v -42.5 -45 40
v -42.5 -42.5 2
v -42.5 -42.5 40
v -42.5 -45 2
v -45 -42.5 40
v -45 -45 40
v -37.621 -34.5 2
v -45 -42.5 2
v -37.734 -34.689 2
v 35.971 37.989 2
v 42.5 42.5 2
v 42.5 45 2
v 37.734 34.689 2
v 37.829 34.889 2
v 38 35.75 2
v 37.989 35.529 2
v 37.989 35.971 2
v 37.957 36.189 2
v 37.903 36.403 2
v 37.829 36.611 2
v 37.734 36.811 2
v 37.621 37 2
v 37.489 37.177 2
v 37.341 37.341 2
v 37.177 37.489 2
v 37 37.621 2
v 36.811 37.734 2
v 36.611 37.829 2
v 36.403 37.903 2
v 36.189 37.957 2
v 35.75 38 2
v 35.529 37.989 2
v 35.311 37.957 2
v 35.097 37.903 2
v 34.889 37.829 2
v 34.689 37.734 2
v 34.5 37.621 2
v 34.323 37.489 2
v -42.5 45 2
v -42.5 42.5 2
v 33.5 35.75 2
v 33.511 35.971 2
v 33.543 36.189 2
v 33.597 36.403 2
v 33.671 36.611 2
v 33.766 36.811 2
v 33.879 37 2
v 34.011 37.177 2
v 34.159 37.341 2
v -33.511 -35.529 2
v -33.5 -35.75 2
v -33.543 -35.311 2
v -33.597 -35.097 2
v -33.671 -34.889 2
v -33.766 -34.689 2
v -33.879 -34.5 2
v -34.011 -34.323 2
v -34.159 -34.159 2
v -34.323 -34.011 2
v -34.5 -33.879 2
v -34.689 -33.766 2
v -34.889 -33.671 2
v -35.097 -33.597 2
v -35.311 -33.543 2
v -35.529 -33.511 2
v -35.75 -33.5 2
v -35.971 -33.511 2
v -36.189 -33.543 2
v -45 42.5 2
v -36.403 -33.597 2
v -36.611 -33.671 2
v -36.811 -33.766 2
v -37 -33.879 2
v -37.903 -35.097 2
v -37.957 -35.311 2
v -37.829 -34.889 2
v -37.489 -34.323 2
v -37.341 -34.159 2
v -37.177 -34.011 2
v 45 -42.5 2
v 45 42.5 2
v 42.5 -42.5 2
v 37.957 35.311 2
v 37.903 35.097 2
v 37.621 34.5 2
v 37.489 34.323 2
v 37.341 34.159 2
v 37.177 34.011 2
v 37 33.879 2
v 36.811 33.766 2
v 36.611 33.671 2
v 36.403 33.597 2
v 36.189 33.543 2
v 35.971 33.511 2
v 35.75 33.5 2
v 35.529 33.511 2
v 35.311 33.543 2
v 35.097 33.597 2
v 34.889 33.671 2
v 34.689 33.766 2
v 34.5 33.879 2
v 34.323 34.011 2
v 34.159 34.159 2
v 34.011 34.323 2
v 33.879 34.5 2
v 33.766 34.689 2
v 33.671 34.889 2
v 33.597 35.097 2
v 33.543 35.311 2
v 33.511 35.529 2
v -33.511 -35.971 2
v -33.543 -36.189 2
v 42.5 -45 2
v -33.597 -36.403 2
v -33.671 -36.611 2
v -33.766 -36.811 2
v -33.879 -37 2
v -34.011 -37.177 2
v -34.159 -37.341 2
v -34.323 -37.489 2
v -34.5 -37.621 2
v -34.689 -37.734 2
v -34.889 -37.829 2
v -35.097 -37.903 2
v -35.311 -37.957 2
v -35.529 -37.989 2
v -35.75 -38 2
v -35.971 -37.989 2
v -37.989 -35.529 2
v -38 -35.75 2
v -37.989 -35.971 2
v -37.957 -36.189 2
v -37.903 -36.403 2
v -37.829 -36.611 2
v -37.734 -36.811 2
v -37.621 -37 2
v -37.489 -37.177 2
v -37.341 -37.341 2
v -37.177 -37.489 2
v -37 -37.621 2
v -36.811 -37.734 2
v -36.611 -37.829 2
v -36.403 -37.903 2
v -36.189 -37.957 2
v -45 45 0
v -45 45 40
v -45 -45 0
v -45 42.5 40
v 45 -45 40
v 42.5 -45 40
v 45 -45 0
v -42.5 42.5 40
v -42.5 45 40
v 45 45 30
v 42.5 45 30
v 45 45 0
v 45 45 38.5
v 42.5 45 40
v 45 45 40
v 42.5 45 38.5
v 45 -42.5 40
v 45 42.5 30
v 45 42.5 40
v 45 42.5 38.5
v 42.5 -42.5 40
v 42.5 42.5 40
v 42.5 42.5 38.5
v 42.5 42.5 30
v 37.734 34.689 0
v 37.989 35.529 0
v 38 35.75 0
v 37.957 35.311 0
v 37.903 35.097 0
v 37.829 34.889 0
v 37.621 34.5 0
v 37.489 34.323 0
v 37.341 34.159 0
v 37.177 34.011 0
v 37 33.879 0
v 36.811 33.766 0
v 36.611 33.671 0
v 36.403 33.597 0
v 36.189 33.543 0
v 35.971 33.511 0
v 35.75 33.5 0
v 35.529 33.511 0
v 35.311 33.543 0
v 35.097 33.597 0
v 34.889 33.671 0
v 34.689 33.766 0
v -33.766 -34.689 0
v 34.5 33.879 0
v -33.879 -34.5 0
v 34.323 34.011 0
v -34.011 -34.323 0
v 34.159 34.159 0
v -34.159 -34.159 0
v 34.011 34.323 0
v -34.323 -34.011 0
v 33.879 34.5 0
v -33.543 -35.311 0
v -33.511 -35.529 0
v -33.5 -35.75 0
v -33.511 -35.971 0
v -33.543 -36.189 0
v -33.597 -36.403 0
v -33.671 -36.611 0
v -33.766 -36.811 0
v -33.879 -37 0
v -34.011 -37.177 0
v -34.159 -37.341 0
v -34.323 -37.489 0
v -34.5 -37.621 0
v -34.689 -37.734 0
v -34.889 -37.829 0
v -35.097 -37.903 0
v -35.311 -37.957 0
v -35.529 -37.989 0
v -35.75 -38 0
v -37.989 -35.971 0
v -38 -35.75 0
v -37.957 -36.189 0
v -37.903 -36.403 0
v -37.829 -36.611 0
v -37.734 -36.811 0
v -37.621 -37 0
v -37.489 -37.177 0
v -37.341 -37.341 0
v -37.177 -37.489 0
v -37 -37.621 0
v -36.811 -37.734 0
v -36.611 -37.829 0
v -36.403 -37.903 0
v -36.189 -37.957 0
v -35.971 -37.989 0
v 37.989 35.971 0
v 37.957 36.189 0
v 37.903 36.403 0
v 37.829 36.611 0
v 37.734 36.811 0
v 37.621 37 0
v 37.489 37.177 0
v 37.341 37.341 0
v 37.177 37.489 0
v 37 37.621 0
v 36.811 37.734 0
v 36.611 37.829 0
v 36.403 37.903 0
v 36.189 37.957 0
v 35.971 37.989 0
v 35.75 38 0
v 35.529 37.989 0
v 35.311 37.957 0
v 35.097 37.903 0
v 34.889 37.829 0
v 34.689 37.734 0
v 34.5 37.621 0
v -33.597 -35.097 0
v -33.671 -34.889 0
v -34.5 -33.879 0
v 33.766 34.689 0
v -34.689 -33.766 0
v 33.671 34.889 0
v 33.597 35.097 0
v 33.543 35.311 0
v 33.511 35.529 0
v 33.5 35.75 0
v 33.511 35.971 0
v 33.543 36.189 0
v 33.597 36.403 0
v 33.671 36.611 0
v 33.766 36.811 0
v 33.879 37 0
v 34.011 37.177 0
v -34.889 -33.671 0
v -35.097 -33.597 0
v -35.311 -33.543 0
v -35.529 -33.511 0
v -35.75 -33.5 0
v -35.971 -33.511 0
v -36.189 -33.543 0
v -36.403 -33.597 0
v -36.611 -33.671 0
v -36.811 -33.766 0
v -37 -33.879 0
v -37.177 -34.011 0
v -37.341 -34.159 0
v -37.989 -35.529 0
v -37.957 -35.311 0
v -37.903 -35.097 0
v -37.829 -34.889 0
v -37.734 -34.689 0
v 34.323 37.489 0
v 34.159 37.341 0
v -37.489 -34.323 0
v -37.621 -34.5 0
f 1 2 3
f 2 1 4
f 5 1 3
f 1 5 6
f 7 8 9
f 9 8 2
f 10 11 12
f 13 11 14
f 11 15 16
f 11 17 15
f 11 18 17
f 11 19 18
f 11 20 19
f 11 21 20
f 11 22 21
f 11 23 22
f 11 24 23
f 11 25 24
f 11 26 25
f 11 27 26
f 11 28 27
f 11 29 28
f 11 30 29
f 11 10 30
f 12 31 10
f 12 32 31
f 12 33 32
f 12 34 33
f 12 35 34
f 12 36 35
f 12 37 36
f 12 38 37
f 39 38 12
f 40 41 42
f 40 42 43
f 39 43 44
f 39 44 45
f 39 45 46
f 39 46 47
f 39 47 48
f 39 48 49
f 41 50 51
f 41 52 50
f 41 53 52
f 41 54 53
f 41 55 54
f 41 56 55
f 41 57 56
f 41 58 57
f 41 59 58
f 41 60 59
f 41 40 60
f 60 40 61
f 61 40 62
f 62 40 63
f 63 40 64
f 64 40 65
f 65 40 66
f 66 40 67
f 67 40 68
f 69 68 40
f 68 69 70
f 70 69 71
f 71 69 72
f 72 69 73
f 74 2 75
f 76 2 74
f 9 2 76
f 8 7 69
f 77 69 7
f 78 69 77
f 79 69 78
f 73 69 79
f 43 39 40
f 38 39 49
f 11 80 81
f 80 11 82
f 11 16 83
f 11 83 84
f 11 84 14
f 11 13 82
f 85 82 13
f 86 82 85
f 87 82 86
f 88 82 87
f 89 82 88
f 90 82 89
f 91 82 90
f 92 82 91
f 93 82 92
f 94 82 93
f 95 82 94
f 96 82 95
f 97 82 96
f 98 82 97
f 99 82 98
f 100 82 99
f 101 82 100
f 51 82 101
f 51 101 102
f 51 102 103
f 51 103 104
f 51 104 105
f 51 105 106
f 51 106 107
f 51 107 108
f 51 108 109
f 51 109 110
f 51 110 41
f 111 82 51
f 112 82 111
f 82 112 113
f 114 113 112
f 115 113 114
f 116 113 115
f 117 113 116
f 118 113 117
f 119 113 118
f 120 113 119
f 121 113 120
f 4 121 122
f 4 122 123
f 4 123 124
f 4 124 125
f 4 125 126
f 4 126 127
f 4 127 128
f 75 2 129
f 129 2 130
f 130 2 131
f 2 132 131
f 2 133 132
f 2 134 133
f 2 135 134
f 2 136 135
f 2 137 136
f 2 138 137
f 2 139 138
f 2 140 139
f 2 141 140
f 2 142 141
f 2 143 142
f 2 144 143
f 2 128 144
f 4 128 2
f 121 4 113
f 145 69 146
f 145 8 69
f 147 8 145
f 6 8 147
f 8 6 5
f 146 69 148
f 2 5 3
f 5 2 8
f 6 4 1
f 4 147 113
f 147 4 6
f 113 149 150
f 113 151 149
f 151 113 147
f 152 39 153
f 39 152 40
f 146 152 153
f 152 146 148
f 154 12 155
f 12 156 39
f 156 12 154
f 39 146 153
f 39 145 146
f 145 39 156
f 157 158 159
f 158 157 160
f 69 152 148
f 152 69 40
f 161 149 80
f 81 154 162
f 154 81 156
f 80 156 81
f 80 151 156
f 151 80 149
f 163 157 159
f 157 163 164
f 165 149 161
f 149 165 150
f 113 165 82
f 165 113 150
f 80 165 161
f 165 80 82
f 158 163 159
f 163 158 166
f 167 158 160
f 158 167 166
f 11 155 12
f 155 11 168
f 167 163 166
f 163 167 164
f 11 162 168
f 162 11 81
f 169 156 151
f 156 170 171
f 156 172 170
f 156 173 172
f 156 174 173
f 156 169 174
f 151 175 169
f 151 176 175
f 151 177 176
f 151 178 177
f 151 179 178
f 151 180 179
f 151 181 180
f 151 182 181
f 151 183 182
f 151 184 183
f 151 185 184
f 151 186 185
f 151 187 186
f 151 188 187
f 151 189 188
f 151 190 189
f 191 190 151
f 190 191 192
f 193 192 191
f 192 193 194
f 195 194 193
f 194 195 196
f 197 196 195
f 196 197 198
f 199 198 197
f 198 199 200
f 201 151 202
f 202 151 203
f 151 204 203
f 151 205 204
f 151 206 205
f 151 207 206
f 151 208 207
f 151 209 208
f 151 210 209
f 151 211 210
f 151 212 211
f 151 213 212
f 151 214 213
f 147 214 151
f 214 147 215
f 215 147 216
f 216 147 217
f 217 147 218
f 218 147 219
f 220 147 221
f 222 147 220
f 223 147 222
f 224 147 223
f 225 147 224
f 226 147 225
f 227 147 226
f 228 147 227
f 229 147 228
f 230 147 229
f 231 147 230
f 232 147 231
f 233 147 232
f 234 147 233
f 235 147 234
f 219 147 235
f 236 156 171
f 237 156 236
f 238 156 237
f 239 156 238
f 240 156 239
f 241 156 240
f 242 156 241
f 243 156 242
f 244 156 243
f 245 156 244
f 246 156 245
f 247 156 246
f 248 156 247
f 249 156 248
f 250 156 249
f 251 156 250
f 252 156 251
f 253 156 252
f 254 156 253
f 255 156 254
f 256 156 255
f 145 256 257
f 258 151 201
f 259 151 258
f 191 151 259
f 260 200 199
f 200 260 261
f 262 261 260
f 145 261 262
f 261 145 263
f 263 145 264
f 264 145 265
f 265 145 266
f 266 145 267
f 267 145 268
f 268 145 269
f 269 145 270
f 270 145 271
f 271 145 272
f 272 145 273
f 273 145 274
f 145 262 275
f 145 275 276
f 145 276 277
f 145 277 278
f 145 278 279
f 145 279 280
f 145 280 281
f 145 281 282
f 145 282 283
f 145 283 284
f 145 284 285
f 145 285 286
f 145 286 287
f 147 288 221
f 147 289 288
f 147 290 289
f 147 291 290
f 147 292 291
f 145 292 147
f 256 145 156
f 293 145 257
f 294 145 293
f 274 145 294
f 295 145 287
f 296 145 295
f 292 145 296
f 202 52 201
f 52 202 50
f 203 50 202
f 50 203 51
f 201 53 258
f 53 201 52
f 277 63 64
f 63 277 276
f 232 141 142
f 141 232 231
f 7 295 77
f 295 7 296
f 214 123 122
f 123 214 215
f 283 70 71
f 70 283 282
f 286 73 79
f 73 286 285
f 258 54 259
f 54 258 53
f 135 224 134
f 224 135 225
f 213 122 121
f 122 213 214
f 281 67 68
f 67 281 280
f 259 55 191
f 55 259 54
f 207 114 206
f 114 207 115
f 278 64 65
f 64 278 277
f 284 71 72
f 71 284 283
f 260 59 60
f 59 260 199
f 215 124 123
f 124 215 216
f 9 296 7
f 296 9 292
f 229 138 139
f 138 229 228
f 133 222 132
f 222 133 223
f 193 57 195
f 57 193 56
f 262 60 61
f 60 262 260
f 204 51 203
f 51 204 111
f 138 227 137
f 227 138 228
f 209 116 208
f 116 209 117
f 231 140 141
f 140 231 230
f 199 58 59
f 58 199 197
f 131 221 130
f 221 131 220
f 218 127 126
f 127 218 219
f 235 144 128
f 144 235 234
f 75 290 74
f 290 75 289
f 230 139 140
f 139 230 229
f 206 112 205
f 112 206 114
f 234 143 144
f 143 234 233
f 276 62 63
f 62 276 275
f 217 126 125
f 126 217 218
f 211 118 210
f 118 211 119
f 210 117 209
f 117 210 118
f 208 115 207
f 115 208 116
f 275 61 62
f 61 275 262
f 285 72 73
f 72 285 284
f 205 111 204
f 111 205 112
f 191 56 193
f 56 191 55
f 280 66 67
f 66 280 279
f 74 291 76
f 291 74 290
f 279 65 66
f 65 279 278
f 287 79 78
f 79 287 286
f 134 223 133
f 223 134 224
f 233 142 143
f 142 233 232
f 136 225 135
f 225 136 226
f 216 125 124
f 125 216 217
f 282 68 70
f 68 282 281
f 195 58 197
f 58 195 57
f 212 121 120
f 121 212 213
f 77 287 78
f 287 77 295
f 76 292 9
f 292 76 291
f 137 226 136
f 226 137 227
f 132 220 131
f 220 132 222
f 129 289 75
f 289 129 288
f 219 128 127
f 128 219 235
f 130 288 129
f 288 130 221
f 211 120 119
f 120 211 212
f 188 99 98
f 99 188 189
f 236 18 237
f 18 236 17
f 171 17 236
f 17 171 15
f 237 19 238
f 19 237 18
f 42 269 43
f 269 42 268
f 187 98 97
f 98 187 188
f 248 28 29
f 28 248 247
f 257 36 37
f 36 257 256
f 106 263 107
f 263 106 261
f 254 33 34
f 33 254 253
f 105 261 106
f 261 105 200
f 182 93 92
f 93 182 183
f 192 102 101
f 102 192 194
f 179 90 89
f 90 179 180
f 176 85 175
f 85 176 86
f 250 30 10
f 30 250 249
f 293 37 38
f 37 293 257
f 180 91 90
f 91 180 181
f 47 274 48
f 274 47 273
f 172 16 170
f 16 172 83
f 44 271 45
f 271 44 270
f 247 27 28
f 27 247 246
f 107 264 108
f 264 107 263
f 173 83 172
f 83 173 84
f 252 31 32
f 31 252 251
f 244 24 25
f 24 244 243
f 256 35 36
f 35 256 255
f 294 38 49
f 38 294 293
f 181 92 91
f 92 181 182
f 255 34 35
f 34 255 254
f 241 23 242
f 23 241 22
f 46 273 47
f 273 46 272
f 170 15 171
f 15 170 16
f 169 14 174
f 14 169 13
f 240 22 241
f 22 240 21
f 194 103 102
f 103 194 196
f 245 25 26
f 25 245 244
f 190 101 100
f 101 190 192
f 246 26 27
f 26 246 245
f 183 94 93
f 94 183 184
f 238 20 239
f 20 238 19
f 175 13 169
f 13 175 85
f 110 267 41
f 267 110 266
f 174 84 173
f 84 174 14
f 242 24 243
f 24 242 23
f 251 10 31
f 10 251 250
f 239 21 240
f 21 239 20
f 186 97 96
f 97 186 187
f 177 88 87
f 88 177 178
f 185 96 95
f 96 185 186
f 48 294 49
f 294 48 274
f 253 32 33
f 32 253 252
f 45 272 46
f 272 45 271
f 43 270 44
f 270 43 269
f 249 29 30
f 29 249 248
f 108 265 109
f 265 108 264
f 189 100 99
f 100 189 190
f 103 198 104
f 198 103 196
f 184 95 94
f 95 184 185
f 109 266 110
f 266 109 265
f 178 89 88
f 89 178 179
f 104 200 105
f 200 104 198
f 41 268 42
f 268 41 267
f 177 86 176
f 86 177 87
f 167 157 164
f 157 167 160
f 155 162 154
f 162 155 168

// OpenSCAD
// DIY magnetic stirrer housing for 80 mm PC case fan
// Print orientation: upside down open box, top plate on bed (z = 0 to 2)
// Walls rise from top plate to open edge at z = 40

$fn = 64;

// ---- Dimensions (mm) ----
top_thickness      = 2;     // top plate thickness (z = 0 to 2)
wall_thickness     = 2.5;   // wall thickness
box_height         = 40;    // total height to open edge (z = 0 to 40)
outer_size         = 90;    // outer size in X and Y
screw_hole_count   = 4;     // number of M4 screw holes
screw_hole_d       = 4.5;   // screw hole diameter
screw_hole_pitch   = 71.5;  // square pitch between hole centres
cable_notch_w      = 12;    // cable notch width
cable_notch_depth  = 8;     // notch depth from open edge (z = 32 to 40)
eps                = 0.5;   // overcut for clean differences

// ---- Model ----
difference() {
    union() {
        // Top plate
        translate([-outer_size/2, -outer_size/2, 0])
            cube([outer_size, outer_size, top_thickness]);

        // Four walls rising from top plate, open at top
        for (sx = [-1, 1], sy = [-1, 1])
            translate([sx > 0 ? outer_size/2 - wall_thickness : -outer_size/2,
                       sy > 0 ? outer_size/2 - wall_thickness : -outer_size/2,
                       top_thickness])
                cube([wall_thickness, wall_thickness, box_height - top_thickness]);
    }

    // Screw holes through top plate, centred on plate
    for (i = [0 : screw_hole_count - 1]) {
        a = (i - (screw_hole_count - 1)/2) * screw_hole_pitch;
        translate([a, a, -eps])
            cylinder(d = screw_hole_d, h = top_thickness + 2*eps);
    }

    // Cable notch in one wall, centred along wall, open edge to z = 40
    translate([outer_size/2 - wall_thickness - cable_notch_w/2,
               0,
               box_height - top_thickness - cable_notch_depth])
        cube([cable_notch_w, outer_size + 2*eps, cable_notch_depth + eps]);
}
